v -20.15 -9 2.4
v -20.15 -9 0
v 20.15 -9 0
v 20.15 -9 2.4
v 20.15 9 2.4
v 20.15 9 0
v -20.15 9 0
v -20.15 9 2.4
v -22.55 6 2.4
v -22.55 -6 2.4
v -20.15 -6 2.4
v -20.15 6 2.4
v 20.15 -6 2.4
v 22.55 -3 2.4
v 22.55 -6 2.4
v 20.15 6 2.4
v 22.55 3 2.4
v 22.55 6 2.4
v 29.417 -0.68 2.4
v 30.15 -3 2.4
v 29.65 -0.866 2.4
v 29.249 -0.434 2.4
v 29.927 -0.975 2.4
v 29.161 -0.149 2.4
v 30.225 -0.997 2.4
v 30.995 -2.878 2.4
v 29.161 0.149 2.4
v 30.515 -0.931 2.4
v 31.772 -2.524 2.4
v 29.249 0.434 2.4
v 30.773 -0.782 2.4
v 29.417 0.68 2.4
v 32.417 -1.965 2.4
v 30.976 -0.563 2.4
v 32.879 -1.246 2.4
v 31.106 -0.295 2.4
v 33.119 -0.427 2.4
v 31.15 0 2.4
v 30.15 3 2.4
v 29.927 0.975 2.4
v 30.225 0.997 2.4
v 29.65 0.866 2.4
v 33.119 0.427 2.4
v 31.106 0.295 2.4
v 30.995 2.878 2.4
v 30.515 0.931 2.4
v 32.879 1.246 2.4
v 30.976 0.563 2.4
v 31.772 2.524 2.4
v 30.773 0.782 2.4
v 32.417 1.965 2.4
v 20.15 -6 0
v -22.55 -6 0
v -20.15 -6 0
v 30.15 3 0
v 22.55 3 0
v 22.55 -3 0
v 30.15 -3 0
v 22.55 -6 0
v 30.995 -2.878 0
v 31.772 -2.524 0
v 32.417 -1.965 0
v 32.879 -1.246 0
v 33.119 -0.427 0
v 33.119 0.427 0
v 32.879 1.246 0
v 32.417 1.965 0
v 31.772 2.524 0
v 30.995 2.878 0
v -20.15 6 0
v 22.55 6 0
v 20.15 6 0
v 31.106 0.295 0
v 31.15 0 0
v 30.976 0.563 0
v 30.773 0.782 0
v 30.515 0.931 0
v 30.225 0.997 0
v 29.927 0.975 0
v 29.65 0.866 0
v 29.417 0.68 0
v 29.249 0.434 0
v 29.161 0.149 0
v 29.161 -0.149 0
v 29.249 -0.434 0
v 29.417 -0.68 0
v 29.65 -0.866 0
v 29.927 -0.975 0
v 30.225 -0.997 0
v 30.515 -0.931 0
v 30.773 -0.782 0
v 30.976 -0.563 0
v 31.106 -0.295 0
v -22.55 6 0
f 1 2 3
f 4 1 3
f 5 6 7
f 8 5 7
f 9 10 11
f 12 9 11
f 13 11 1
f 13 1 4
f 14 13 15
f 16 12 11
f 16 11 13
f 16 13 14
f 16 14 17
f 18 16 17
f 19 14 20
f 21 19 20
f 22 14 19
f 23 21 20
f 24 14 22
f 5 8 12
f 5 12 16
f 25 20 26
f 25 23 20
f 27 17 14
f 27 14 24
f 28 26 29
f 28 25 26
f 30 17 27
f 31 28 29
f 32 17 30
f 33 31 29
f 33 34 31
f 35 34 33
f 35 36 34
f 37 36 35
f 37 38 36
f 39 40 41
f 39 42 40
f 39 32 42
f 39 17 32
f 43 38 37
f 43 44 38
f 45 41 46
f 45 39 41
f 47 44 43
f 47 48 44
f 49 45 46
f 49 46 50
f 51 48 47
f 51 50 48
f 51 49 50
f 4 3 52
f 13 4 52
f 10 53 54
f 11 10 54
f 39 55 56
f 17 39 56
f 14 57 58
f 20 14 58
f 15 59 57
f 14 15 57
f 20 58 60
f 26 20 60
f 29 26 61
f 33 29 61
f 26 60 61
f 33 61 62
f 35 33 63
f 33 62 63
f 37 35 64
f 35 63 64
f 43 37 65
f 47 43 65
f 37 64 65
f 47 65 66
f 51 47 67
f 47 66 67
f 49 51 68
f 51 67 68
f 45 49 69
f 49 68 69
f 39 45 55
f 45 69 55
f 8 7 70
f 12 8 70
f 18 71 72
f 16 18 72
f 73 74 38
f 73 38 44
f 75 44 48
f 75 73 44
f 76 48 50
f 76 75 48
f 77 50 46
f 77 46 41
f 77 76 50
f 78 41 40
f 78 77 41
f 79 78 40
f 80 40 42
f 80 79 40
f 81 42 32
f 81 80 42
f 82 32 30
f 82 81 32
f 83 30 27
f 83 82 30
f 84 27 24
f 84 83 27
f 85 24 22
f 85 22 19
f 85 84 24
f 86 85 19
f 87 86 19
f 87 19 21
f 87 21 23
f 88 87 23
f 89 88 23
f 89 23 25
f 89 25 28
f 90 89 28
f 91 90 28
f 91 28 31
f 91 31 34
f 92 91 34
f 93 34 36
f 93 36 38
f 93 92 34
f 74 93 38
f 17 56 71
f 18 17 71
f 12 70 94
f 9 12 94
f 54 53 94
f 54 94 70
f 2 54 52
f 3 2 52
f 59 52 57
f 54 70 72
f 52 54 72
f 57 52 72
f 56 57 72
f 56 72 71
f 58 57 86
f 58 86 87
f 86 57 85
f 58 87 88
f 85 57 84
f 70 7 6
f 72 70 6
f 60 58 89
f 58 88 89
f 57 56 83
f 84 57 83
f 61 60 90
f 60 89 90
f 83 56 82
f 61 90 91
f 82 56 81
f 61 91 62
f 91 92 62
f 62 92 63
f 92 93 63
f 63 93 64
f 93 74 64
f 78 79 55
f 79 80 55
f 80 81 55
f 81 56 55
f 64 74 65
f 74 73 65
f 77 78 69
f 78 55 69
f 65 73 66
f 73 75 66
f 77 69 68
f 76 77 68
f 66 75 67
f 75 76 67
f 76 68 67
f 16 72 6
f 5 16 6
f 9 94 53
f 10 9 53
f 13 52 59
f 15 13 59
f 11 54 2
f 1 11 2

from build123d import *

# Parameters (mm, degrees)
SKETCH1_R           = 1
BOSS_EXTRUDE1_DEPTH = 2.4


with BuildPart() as part:
    # Sketch1 → Boss-Extrude1 (new body)
    with BuildSketch(Plane.XY):
        with BuildLine():
            Line((22.55, -3), (30.15, -3))
            ThreePointArc((30.15, -3), (33.15, 0), (30.15, 3))
            Line((30.15, 3), (22.55, 3))
            Line((22.55, 3), (22.55, 6))
            Line((22.55, 6), (20.15, 6))
            Line((20.15, 6), (20.15, 9))
            Line((20.15, 9), (-20.15, 9))
            Line((-20.15, 9), (-20.15, 6))
            Line((-20.15, 6), (-22.55, 6))
            Line((-22.55, 6), (-22.55, -6))
            Line((-22.55, -6), (-20.15, -6))
            Line((-20.15, -6), (-20.15, -9))
            Line((-20.15, -9), (20.15, -9))
            Line((20.15, -9), (20.15, -6))
            Line((20.15, -6), (22.55, -6))
            Line((22.55, -6), (22.55, -3))
        make_face()
        with Locations((30.15, 0)):
            Circle(SKETCH1_R, mode=Mode.SUBTRACT)
    extrude(amount=BOSS_EXTRUDE1_DEPTH)


solid = part.part
